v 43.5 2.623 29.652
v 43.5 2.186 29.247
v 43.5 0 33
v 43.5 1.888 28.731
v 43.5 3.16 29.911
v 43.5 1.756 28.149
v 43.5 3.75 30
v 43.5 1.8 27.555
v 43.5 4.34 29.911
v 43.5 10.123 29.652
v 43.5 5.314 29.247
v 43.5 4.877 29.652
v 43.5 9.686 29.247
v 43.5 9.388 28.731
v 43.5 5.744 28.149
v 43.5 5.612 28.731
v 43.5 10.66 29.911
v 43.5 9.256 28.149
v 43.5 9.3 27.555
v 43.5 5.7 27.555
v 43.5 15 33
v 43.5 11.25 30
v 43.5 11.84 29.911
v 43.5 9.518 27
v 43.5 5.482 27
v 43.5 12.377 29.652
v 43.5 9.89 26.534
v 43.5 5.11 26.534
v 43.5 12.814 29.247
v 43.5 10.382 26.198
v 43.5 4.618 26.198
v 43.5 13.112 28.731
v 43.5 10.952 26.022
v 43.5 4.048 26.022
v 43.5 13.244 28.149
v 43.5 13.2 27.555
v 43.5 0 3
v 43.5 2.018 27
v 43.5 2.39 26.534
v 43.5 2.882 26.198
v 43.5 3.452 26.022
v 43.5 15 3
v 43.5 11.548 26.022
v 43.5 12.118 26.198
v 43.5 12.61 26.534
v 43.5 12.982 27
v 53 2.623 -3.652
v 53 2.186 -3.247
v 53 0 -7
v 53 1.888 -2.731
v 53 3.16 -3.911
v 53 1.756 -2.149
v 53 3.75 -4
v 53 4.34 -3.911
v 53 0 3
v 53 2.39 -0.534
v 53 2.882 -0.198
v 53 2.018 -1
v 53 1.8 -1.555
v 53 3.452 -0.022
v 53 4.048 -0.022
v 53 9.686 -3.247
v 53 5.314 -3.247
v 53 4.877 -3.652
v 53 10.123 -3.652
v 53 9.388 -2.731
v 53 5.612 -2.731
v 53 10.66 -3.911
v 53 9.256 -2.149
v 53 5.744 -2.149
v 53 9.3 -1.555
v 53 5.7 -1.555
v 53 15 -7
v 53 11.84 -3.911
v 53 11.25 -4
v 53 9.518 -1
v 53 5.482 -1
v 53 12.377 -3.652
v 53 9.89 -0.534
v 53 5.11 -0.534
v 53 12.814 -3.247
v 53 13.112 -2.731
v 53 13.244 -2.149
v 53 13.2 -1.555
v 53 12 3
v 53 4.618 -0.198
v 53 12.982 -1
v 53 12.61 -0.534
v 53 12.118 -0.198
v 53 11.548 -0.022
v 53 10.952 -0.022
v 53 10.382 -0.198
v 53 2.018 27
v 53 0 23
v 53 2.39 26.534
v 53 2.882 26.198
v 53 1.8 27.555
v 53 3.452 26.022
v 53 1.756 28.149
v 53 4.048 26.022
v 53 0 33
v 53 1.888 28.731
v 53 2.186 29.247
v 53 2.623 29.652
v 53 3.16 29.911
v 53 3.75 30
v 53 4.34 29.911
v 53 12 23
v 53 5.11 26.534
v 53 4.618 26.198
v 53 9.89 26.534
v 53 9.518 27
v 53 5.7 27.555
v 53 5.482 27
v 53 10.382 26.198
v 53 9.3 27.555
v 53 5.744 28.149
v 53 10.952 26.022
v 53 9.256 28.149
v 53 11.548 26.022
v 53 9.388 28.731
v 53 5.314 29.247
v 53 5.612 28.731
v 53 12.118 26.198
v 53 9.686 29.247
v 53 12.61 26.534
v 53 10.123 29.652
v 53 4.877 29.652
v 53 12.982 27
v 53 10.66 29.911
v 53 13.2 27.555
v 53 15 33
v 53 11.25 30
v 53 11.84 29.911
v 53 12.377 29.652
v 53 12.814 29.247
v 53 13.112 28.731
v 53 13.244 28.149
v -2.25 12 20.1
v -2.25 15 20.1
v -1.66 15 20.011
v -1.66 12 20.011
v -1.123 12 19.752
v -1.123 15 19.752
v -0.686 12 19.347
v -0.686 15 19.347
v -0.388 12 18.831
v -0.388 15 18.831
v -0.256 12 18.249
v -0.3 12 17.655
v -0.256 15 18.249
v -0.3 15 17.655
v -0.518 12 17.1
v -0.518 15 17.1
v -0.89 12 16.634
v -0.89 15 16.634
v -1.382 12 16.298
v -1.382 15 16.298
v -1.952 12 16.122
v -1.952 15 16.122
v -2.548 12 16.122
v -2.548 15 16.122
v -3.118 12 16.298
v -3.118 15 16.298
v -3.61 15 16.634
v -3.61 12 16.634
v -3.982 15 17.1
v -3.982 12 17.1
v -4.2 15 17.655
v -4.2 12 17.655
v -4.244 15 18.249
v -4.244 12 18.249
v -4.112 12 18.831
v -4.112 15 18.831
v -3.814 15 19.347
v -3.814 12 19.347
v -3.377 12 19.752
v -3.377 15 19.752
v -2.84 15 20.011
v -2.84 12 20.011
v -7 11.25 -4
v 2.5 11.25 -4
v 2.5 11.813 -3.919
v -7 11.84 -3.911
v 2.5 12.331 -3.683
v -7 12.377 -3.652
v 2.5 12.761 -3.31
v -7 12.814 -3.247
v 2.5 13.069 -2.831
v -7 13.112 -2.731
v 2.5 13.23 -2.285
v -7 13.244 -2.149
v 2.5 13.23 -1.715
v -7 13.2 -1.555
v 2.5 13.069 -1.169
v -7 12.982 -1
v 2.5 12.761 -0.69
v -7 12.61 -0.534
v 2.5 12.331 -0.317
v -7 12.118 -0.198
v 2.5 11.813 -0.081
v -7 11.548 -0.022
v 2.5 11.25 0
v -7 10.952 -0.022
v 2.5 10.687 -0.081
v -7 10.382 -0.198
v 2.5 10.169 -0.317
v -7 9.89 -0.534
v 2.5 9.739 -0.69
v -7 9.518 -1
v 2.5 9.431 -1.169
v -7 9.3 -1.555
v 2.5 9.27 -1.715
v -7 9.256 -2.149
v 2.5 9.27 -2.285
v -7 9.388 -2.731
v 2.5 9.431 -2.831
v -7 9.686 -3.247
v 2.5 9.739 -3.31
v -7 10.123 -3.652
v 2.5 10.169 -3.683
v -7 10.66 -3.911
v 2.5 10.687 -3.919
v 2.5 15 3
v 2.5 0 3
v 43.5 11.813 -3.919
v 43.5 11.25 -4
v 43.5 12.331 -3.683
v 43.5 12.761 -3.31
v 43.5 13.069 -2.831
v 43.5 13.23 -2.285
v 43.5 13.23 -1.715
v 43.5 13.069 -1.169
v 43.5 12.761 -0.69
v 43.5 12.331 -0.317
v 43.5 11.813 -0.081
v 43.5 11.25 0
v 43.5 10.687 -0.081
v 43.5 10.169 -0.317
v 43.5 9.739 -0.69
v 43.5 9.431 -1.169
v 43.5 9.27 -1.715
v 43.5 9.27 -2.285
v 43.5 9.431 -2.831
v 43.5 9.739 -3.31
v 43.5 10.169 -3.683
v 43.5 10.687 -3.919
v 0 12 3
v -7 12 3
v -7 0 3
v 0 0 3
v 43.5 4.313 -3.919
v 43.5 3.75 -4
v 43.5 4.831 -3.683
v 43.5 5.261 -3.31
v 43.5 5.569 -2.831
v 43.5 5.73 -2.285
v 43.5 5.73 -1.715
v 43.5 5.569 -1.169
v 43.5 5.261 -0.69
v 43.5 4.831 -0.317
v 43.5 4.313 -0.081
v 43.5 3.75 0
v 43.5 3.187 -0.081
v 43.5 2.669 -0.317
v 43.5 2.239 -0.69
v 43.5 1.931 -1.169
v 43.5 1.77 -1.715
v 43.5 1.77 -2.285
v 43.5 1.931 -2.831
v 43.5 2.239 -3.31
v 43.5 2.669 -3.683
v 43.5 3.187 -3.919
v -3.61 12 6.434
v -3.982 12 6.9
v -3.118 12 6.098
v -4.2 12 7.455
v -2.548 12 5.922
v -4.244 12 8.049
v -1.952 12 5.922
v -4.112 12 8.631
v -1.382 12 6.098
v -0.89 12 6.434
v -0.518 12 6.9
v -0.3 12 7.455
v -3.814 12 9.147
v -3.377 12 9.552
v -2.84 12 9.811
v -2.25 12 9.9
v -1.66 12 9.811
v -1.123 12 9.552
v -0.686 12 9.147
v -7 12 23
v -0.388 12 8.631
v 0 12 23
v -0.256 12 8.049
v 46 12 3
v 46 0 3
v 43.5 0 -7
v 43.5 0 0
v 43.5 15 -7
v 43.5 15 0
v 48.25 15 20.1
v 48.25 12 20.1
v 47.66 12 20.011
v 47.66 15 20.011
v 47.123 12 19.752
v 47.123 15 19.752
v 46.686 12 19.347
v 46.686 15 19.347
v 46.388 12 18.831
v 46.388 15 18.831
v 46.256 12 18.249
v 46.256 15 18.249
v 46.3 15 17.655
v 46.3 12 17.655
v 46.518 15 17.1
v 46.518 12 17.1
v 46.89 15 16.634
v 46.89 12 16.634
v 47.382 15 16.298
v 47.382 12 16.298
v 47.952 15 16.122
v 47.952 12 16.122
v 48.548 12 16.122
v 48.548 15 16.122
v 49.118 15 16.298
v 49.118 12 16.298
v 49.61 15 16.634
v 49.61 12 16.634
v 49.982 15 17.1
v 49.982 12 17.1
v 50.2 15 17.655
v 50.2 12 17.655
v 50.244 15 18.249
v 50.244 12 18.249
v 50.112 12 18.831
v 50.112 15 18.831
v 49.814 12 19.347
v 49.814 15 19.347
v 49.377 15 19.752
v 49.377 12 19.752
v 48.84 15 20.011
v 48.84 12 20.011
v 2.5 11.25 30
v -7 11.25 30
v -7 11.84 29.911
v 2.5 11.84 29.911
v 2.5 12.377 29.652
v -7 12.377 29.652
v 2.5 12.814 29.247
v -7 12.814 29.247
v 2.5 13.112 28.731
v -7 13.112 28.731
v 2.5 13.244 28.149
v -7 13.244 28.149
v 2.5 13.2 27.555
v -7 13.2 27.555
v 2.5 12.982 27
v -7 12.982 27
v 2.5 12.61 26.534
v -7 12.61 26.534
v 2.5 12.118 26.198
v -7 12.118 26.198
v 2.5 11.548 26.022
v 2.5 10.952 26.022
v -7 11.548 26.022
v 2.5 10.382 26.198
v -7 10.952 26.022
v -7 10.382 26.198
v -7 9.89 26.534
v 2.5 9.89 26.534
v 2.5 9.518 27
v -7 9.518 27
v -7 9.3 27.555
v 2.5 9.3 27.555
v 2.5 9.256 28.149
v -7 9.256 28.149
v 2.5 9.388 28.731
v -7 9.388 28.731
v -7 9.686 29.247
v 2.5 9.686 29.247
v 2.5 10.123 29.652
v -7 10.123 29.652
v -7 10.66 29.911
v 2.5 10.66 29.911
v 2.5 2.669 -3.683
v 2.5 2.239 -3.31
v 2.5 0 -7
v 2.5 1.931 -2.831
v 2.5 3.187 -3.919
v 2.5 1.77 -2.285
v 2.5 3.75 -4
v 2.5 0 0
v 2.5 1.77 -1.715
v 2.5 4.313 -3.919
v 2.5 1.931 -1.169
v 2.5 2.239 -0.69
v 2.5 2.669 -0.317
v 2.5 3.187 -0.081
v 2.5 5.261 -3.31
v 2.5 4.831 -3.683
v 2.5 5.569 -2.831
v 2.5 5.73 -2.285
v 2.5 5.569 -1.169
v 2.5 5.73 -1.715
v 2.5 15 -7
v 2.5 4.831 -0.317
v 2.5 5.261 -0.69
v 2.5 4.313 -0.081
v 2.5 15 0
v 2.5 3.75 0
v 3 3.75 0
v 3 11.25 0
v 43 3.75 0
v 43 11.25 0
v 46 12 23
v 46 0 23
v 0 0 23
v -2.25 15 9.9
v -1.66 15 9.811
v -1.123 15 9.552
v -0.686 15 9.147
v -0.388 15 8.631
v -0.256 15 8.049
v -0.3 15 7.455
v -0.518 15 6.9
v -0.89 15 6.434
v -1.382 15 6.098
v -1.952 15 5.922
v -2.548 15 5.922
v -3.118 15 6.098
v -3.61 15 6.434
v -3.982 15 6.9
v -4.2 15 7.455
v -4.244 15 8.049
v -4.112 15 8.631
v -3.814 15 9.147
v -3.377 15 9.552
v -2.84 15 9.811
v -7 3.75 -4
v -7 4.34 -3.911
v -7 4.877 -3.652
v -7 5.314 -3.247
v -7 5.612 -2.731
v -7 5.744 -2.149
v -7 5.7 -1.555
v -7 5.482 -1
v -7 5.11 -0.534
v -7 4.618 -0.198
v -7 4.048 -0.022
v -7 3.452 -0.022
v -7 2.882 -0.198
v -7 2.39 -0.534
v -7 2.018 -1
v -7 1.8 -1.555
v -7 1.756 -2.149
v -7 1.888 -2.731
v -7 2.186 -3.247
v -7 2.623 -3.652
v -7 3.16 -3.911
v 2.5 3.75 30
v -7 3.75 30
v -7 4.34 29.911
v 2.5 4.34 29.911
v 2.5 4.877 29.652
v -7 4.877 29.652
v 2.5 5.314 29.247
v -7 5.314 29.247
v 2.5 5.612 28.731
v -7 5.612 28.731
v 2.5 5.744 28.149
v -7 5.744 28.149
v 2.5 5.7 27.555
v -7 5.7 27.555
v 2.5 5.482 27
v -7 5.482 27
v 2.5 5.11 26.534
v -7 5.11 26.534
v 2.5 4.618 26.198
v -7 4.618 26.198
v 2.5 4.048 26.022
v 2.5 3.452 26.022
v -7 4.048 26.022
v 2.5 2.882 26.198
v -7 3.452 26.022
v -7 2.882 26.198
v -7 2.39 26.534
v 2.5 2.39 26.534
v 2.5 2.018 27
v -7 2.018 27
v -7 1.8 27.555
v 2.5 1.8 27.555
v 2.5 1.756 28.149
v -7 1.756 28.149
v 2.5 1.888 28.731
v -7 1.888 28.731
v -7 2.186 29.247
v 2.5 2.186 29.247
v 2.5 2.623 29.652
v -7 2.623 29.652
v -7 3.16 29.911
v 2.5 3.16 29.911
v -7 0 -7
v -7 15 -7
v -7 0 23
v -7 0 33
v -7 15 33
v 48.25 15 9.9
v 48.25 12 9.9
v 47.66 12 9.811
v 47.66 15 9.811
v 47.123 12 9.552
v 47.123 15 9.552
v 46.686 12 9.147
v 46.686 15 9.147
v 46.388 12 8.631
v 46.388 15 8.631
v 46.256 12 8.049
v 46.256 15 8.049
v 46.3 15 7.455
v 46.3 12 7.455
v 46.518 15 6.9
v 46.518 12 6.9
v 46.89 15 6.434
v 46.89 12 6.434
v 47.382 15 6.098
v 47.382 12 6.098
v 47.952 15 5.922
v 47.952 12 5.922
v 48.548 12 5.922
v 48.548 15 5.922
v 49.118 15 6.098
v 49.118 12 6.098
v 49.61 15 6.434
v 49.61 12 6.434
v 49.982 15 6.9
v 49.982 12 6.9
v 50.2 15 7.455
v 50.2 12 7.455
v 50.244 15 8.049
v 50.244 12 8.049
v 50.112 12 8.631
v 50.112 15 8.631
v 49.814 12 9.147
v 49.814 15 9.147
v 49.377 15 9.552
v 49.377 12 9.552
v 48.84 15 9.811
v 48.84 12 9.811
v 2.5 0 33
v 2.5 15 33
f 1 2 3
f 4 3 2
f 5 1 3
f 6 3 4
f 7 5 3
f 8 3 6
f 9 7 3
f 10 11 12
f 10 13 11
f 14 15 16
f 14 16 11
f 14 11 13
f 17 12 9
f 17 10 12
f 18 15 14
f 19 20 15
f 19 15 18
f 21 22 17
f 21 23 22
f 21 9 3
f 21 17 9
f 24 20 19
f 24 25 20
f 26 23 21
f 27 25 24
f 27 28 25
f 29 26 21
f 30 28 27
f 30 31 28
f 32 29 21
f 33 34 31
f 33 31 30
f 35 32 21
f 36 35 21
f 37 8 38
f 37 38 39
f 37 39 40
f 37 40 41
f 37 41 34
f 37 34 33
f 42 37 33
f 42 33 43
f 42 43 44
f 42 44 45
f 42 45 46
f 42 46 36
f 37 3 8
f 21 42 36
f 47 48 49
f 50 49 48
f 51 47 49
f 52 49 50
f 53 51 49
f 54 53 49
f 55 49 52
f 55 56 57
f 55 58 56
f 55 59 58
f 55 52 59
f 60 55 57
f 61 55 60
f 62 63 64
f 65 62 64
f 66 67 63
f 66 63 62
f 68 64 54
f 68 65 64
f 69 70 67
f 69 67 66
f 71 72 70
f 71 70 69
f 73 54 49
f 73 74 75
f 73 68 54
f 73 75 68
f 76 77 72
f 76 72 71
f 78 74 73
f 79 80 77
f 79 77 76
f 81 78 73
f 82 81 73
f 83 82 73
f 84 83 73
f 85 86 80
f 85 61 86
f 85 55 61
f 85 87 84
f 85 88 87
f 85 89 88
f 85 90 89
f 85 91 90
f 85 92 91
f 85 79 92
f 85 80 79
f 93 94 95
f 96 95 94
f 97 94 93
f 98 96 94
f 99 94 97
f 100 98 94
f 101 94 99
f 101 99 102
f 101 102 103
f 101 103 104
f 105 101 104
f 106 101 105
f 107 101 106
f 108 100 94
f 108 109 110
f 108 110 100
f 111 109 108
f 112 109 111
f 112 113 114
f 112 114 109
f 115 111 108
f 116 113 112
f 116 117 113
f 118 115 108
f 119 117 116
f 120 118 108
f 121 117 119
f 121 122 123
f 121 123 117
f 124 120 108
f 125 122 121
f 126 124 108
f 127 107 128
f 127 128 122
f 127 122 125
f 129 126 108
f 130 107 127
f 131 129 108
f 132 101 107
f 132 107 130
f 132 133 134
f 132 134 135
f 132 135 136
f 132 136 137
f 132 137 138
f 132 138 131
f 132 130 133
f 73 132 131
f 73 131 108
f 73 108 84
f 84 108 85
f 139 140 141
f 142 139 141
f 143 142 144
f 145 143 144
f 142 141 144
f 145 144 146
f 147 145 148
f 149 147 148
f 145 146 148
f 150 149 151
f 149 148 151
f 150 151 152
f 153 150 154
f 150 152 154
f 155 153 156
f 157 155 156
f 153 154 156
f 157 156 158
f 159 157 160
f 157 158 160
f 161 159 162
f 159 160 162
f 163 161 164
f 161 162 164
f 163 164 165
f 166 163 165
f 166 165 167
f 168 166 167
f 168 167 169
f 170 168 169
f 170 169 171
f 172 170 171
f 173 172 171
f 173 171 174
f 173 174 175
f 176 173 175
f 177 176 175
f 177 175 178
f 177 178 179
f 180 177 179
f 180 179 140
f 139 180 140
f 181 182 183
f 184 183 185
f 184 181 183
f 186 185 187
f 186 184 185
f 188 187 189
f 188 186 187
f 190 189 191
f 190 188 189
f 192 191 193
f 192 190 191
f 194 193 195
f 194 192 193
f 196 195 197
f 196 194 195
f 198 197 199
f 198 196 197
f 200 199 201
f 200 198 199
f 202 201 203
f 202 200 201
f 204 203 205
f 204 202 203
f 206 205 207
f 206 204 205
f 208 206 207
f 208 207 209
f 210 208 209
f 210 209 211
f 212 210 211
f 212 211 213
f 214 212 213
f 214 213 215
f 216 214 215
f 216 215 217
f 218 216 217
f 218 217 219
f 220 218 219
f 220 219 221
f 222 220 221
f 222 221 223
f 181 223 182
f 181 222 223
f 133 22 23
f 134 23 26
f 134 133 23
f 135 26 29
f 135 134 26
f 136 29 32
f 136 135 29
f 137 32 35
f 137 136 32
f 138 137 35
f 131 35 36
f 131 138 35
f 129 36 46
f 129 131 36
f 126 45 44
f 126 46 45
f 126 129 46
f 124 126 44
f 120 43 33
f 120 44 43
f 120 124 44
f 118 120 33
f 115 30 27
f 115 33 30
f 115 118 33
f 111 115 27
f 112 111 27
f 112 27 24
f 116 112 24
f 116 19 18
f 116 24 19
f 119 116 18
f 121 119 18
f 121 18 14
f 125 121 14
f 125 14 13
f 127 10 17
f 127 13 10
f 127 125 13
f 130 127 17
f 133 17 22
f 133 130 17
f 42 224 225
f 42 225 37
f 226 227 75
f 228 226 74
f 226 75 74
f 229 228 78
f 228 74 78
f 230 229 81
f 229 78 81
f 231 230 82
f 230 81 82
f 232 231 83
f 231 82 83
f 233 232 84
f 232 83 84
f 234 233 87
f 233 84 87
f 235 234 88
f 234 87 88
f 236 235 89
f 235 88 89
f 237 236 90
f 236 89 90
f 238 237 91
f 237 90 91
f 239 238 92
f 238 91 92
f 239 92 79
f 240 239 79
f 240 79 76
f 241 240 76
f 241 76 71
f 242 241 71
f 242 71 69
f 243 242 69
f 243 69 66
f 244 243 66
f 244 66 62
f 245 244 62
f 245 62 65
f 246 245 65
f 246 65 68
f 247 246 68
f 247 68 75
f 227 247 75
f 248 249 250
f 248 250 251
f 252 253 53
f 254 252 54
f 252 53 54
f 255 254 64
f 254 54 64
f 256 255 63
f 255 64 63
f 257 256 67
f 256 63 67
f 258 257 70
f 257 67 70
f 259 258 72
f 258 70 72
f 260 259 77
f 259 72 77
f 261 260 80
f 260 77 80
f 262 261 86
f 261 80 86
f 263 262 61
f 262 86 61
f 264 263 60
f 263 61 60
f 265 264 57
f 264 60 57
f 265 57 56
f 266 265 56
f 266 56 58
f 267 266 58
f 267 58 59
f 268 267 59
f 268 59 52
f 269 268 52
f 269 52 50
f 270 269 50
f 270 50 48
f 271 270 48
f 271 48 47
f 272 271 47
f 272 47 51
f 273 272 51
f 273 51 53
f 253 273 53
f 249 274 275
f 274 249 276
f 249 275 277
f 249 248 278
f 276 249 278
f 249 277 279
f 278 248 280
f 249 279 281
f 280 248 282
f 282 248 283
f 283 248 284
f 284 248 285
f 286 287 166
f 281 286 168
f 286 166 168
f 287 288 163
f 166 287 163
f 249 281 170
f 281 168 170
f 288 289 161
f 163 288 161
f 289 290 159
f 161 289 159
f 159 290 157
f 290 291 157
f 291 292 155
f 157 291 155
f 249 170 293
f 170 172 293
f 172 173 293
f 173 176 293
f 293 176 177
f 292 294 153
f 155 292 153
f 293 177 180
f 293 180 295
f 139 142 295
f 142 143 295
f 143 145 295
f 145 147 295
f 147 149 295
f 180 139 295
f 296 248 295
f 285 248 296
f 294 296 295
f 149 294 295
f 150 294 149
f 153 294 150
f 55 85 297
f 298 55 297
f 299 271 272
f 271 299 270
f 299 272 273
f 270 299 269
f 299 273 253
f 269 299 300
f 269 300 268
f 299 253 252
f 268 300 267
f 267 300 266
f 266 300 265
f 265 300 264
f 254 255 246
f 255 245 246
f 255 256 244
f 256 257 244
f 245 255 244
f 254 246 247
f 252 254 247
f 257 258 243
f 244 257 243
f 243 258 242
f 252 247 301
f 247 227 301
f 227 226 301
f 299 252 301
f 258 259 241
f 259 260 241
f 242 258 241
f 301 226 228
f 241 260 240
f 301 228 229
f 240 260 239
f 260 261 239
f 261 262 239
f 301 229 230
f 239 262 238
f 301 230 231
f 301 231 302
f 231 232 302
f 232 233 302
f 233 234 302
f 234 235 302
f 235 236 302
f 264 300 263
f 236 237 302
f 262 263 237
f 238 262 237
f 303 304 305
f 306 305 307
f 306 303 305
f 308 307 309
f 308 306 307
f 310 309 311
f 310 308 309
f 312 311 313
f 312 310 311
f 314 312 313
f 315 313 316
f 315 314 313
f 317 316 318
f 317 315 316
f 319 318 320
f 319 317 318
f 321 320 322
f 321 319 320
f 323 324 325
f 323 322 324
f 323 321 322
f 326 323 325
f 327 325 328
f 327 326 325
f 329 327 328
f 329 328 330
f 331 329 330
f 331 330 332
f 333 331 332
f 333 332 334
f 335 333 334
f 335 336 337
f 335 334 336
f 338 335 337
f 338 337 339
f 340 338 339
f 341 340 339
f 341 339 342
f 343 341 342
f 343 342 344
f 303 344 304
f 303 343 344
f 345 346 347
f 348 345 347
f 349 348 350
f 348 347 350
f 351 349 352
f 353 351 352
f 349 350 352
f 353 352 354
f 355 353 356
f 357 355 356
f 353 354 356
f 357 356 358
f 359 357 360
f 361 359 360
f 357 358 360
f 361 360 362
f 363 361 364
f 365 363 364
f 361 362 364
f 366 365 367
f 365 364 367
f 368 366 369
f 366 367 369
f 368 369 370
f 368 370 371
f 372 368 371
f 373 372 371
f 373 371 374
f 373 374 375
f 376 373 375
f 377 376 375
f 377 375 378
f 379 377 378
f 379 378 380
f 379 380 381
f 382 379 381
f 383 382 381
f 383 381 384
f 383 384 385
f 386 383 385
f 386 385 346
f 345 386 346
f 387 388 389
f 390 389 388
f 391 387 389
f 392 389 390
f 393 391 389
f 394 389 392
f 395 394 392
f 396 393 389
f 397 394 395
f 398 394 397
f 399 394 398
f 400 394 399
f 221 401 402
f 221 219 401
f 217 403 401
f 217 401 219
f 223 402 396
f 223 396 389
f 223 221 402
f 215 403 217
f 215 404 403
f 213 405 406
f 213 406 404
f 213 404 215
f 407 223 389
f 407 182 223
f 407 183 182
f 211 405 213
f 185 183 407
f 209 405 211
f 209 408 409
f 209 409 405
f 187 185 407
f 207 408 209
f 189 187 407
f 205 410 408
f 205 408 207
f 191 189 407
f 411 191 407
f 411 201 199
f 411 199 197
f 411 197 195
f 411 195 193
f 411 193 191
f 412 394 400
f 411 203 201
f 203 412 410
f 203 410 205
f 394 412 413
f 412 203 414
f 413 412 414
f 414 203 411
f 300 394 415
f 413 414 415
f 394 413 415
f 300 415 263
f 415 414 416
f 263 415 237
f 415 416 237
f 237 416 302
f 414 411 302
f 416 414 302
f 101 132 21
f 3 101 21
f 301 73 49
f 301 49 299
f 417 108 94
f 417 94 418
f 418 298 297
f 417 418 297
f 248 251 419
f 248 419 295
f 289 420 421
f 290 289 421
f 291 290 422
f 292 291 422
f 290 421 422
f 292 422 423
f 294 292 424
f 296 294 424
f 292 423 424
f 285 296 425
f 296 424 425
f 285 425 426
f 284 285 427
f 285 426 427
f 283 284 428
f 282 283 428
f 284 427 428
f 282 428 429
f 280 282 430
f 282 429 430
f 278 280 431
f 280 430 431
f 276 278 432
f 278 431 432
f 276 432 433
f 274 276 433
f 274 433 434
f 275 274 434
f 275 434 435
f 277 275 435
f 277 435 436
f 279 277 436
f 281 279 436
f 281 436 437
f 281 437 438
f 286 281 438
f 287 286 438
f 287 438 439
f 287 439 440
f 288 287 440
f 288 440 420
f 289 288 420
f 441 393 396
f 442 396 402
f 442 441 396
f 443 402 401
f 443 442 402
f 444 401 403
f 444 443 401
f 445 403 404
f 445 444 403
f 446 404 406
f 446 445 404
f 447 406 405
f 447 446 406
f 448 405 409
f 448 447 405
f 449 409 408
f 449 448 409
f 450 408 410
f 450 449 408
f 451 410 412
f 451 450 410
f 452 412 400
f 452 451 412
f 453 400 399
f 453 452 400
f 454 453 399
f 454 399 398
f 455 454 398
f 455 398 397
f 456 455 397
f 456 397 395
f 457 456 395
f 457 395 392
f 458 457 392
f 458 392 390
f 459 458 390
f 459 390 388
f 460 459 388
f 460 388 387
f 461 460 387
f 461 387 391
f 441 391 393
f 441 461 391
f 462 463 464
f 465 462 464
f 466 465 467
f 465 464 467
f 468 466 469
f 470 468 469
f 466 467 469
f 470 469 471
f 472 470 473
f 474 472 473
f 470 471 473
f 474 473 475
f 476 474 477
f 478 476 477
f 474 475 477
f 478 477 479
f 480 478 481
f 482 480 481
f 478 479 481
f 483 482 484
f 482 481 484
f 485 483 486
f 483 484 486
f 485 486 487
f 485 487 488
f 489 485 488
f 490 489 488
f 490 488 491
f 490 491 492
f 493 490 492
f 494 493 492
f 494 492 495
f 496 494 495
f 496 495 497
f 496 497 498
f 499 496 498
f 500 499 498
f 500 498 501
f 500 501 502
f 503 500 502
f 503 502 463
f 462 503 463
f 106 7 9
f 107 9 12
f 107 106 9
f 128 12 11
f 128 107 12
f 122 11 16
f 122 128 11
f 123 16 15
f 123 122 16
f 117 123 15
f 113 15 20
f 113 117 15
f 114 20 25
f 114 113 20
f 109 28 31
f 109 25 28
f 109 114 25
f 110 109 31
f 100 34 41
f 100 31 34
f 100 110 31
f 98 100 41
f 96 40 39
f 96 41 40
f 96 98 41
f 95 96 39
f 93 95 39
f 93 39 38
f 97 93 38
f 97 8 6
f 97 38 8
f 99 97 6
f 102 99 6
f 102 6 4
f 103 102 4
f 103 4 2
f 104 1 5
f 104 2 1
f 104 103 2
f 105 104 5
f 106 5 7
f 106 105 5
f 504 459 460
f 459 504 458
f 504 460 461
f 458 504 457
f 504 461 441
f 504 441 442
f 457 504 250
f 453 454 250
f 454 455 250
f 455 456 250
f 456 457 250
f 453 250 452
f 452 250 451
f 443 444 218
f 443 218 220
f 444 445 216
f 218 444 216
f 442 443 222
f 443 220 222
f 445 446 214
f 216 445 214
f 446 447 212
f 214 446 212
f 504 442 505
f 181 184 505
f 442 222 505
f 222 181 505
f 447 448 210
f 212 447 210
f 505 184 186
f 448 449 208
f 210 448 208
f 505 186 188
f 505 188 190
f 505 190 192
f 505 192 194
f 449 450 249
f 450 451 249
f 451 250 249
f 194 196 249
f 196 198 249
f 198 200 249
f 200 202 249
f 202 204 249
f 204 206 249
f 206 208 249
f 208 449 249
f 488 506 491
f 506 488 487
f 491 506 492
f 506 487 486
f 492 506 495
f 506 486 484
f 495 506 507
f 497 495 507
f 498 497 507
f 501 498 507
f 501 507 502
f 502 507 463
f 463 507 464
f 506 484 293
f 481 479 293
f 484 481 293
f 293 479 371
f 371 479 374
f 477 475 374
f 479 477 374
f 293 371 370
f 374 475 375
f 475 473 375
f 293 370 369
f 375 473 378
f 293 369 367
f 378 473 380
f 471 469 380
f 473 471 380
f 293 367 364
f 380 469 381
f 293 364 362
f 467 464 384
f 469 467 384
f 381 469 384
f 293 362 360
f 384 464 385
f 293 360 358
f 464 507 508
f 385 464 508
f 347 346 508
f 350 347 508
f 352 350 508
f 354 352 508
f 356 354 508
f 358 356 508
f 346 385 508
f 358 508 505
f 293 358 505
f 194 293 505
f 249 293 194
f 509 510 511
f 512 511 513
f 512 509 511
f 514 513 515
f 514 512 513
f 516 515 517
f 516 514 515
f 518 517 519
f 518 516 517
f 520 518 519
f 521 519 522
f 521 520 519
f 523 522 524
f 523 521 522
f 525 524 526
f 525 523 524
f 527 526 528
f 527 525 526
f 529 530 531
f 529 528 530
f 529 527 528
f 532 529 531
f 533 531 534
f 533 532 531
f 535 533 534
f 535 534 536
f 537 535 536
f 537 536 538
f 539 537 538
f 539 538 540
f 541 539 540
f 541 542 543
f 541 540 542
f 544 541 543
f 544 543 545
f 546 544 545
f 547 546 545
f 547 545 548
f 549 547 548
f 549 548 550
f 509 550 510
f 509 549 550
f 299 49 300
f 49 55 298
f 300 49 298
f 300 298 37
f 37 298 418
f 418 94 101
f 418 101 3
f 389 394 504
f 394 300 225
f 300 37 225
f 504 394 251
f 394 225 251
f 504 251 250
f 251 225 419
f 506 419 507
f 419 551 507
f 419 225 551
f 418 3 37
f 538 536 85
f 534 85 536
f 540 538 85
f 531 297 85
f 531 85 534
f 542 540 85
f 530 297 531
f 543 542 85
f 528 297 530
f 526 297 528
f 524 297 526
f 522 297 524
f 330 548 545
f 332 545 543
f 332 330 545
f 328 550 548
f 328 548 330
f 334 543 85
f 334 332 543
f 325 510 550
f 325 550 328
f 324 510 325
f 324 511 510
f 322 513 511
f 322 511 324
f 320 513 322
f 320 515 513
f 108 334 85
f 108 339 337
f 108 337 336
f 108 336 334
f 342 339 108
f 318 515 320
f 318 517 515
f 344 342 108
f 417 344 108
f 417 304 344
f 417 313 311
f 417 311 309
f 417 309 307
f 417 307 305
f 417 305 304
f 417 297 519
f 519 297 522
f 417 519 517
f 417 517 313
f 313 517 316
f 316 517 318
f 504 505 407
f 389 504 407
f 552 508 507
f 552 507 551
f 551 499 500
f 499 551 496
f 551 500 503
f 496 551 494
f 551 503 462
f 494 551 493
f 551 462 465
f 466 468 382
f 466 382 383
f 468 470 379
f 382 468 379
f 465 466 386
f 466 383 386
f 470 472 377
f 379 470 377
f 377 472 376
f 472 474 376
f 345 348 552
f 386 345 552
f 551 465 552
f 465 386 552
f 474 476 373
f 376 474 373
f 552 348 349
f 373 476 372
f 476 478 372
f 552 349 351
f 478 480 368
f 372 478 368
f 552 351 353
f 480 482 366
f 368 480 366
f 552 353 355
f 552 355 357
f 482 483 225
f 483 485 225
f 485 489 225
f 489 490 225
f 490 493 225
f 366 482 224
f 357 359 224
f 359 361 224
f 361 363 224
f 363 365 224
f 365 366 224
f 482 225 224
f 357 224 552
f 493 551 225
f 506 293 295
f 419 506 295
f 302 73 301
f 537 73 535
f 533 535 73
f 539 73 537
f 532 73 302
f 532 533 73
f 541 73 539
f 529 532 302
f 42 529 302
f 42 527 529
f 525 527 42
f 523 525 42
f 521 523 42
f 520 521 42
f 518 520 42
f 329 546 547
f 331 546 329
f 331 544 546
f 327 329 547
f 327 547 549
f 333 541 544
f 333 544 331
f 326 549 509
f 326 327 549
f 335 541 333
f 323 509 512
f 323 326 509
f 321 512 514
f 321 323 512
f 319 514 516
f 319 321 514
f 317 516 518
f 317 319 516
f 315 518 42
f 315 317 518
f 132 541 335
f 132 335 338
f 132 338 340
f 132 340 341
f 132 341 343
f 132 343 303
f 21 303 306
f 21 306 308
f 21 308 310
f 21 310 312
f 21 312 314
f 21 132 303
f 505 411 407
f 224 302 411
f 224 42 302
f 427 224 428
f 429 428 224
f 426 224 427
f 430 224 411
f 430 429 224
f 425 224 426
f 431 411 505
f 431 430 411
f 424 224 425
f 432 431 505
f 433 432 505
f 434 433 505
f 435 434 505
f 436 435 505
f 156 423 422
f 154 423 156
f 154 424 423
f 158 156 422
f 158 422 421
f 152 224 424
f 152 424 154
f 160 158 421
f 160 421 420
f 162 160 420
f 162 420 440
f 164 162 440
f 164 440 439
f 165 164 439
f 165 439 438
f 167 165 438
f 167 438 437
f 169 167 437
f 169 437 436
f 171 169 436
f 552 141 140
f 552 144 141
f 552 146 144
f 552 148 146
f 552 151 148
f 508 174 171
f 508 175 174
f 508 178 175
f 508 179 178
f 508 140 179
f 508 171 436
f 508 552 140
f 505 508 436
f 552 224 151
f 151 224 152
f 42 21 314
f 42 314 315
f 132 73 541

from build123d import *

# Parameters (mm, degrees)
SKETCH1_W               = 46
SKETCH1_H               = 15
BOSS_EXTRUDE1_DEPTH     = 3
SKETCH3_W               = 2.5
SKETCH3_H               = 15
BOSS_EXTRUDE2_DEPTH     = 20
SKETCH4_W               = 20
SKETCH4_H               = 3
BOSS_EXTRUDE3_DEPTH     = 7
SKETCH5_R               = 2
CUT_EXTRUDE1_DEPTH      = 7
SKETCH7_W               = 9.5
SKETCH7_H               = 15
BOSS_EXTRUDE4_DEPTH     = 10
SKETCH8_R               = 2
CUT_EXTRUDE2_DEPTH      = 10
MIRROR3_COPY_1_SKETCH_W = 9.5
MIRROR3_COPY_1_SKETCH_H = 15
MIRROR3_COPY_1_DEPTH    = 10
MIRROR3_COPY_2_SKETCH_R = 2
MIRROR3_COPY_2_DEPTH    = 10


with BuildPart() as part:
    # Sketch1 → Boss-Extrude1 (new body)
    with BuildSketch(Plane.XY):
        with Locations((23, 7.5)):
            Rectangle(SKETCH1_W, SKETCH1_H)
    extrude(amount=BOSS_EXTRUDE1_DEPTH)

    # Sketch3 → Boss-Extrude2 (add)
    with BuildSketch(Plane.XY.offset(3)):
        with Locations((1.25, 7.5)):
            Rectangle(SKETCH3_W, SKETCH3_H)
    boss_extrude2 = extrude(amount=BOSS_EXTRUDE2_DEPTH)

    # Sketch4 → Boss-Extrude3 (add)
    with BuildSketch(Plane.ZY):
        with Locations((13, 13.5)):
            Rectangle(SKETCH4_W, SKETCH4_H)
    boss_extrude3 = extrude(amount=BOSS_EXTRUDE3_DEPTH)

    # Sketch5 → Cut-Extrude1 (cut)
    with BuildSketch(Plane(origin=(0, 15, 0), x_dir=(1, 0, 0), z_dir=(0, 1, 0))):
        with Locations(Location((-2.25, -18.1, 0), (0, 0, 270))):
            Circle(SKETCH5_R)
        with Locations(Location((-2.25, -7.9, 0), (0, 0, 270))):
            Circle(SKETCH5_R)
    cut_extrude1 = extrude(amount=-CUT_EXTRUDE1_DEPTH, mode=Mode.SUBTRACT)

    # Mirror1: Boss-Extrude2, Boss-Extrude3, Cut-Extrude1 across plane
    add(boss_extrude2.mirror(Plane(origin=(23, 0, 0), x_dir=(0, 0, 1), z_dir=(1, 0, 0))))
    add(boss_extrude3.mirror(Plane(origin=(23, 0, 0), x_dir=(0, 0, 1), z_dir=(1, 0, 0))))
    add(cut_extrude1.mirror(Plane(origin=(23, 0, 0), x_dir=(0, 0, 1), z_dir=(1, 0, 0))), mode=Mode.SUBTRACT)

    # Sketch7 → Boss-Extrude4 (add)
    with BuildSketch(Plane.XY.offset(23)):
        with Locations((-2.25, 7.5)):
            Rectangle(SKETCH7_W, SKETCH7_H)
    boss_extrude4 = extrude(amount=BOSS_EXTRUDE4_DEPTH)

    # Sketch8 → Cut-Extrude2 (cut)
    with BuildSketch(Plane.ZY.offset(7)):
        with Locations((28, 11.25)):
            Circle(SKETCH8_R)
        with Locations((28, 3.75)):
            Circle(SKETCH8_R)
    cut_extrude2 = extrude(amount=-CUT_EXTRUDE2_DEPTH, mode=Mode.SUBTRACT)

    # Mirror2: Boss-Extrude4, Cut-Extrude2 across plane
    add(boss_extrude4.mirror(Plane(origin=(23, 0, 0), x_dir=(0, 0, 1), z_dir=(1, 0, 0))))
    add(cut_extrude2.mirror(Plane(origin=(23, 0, 0), x_dir=(0, 0, 1), z_dir=(1, 0, 0))), mode=Mode.SUBTRACT)

    # Mirror3: Boss-Extrude4, Cut-Extrude2 across plane
    add(boss_extrude4.mirror(Plane.XY.offset(13)))
    add(cut_extrude2.mirror(Plane.XY.offset(13)), mode=Mode.SUBTRACT)

    # Mirror3 copy 1 sketch → Mirror3 copy 1 (add)
    with BuildSketch(Plane(origin=(46, 0, 3), x_dir=(-1, 0, 0), z_dir=(0, 0, -1))):
        with Locations((-2.25, 7.5)):
            Rectangle(MIRROR3_COPY_1_SKETCH_W, MIRROR3_COPY_1_SKETCH_H)
    extrude(amount=MIRROR3_COPY_1_DEPTH)

    # Mirror3 copy 2 sketch → Mirror3 copy 2 (cut)
    with BuildSketch(Plane(origin=(53, 0, 26), x_dir=(0, 0, -1), z_dir=(1, 0, 0))):
        with Locations((28, 11.25)):
            Circle(MIRROR3_COPY_2_SKETCH_R)
        with Locations((28, 3.75)):
            Circle(MIRROR3_COPY_2_SKETCH_R)
    extrude(amount=-MIRROR3_COPY_2_DEPTH, mode=Mode.SUBTRACT)


solid = part.part
